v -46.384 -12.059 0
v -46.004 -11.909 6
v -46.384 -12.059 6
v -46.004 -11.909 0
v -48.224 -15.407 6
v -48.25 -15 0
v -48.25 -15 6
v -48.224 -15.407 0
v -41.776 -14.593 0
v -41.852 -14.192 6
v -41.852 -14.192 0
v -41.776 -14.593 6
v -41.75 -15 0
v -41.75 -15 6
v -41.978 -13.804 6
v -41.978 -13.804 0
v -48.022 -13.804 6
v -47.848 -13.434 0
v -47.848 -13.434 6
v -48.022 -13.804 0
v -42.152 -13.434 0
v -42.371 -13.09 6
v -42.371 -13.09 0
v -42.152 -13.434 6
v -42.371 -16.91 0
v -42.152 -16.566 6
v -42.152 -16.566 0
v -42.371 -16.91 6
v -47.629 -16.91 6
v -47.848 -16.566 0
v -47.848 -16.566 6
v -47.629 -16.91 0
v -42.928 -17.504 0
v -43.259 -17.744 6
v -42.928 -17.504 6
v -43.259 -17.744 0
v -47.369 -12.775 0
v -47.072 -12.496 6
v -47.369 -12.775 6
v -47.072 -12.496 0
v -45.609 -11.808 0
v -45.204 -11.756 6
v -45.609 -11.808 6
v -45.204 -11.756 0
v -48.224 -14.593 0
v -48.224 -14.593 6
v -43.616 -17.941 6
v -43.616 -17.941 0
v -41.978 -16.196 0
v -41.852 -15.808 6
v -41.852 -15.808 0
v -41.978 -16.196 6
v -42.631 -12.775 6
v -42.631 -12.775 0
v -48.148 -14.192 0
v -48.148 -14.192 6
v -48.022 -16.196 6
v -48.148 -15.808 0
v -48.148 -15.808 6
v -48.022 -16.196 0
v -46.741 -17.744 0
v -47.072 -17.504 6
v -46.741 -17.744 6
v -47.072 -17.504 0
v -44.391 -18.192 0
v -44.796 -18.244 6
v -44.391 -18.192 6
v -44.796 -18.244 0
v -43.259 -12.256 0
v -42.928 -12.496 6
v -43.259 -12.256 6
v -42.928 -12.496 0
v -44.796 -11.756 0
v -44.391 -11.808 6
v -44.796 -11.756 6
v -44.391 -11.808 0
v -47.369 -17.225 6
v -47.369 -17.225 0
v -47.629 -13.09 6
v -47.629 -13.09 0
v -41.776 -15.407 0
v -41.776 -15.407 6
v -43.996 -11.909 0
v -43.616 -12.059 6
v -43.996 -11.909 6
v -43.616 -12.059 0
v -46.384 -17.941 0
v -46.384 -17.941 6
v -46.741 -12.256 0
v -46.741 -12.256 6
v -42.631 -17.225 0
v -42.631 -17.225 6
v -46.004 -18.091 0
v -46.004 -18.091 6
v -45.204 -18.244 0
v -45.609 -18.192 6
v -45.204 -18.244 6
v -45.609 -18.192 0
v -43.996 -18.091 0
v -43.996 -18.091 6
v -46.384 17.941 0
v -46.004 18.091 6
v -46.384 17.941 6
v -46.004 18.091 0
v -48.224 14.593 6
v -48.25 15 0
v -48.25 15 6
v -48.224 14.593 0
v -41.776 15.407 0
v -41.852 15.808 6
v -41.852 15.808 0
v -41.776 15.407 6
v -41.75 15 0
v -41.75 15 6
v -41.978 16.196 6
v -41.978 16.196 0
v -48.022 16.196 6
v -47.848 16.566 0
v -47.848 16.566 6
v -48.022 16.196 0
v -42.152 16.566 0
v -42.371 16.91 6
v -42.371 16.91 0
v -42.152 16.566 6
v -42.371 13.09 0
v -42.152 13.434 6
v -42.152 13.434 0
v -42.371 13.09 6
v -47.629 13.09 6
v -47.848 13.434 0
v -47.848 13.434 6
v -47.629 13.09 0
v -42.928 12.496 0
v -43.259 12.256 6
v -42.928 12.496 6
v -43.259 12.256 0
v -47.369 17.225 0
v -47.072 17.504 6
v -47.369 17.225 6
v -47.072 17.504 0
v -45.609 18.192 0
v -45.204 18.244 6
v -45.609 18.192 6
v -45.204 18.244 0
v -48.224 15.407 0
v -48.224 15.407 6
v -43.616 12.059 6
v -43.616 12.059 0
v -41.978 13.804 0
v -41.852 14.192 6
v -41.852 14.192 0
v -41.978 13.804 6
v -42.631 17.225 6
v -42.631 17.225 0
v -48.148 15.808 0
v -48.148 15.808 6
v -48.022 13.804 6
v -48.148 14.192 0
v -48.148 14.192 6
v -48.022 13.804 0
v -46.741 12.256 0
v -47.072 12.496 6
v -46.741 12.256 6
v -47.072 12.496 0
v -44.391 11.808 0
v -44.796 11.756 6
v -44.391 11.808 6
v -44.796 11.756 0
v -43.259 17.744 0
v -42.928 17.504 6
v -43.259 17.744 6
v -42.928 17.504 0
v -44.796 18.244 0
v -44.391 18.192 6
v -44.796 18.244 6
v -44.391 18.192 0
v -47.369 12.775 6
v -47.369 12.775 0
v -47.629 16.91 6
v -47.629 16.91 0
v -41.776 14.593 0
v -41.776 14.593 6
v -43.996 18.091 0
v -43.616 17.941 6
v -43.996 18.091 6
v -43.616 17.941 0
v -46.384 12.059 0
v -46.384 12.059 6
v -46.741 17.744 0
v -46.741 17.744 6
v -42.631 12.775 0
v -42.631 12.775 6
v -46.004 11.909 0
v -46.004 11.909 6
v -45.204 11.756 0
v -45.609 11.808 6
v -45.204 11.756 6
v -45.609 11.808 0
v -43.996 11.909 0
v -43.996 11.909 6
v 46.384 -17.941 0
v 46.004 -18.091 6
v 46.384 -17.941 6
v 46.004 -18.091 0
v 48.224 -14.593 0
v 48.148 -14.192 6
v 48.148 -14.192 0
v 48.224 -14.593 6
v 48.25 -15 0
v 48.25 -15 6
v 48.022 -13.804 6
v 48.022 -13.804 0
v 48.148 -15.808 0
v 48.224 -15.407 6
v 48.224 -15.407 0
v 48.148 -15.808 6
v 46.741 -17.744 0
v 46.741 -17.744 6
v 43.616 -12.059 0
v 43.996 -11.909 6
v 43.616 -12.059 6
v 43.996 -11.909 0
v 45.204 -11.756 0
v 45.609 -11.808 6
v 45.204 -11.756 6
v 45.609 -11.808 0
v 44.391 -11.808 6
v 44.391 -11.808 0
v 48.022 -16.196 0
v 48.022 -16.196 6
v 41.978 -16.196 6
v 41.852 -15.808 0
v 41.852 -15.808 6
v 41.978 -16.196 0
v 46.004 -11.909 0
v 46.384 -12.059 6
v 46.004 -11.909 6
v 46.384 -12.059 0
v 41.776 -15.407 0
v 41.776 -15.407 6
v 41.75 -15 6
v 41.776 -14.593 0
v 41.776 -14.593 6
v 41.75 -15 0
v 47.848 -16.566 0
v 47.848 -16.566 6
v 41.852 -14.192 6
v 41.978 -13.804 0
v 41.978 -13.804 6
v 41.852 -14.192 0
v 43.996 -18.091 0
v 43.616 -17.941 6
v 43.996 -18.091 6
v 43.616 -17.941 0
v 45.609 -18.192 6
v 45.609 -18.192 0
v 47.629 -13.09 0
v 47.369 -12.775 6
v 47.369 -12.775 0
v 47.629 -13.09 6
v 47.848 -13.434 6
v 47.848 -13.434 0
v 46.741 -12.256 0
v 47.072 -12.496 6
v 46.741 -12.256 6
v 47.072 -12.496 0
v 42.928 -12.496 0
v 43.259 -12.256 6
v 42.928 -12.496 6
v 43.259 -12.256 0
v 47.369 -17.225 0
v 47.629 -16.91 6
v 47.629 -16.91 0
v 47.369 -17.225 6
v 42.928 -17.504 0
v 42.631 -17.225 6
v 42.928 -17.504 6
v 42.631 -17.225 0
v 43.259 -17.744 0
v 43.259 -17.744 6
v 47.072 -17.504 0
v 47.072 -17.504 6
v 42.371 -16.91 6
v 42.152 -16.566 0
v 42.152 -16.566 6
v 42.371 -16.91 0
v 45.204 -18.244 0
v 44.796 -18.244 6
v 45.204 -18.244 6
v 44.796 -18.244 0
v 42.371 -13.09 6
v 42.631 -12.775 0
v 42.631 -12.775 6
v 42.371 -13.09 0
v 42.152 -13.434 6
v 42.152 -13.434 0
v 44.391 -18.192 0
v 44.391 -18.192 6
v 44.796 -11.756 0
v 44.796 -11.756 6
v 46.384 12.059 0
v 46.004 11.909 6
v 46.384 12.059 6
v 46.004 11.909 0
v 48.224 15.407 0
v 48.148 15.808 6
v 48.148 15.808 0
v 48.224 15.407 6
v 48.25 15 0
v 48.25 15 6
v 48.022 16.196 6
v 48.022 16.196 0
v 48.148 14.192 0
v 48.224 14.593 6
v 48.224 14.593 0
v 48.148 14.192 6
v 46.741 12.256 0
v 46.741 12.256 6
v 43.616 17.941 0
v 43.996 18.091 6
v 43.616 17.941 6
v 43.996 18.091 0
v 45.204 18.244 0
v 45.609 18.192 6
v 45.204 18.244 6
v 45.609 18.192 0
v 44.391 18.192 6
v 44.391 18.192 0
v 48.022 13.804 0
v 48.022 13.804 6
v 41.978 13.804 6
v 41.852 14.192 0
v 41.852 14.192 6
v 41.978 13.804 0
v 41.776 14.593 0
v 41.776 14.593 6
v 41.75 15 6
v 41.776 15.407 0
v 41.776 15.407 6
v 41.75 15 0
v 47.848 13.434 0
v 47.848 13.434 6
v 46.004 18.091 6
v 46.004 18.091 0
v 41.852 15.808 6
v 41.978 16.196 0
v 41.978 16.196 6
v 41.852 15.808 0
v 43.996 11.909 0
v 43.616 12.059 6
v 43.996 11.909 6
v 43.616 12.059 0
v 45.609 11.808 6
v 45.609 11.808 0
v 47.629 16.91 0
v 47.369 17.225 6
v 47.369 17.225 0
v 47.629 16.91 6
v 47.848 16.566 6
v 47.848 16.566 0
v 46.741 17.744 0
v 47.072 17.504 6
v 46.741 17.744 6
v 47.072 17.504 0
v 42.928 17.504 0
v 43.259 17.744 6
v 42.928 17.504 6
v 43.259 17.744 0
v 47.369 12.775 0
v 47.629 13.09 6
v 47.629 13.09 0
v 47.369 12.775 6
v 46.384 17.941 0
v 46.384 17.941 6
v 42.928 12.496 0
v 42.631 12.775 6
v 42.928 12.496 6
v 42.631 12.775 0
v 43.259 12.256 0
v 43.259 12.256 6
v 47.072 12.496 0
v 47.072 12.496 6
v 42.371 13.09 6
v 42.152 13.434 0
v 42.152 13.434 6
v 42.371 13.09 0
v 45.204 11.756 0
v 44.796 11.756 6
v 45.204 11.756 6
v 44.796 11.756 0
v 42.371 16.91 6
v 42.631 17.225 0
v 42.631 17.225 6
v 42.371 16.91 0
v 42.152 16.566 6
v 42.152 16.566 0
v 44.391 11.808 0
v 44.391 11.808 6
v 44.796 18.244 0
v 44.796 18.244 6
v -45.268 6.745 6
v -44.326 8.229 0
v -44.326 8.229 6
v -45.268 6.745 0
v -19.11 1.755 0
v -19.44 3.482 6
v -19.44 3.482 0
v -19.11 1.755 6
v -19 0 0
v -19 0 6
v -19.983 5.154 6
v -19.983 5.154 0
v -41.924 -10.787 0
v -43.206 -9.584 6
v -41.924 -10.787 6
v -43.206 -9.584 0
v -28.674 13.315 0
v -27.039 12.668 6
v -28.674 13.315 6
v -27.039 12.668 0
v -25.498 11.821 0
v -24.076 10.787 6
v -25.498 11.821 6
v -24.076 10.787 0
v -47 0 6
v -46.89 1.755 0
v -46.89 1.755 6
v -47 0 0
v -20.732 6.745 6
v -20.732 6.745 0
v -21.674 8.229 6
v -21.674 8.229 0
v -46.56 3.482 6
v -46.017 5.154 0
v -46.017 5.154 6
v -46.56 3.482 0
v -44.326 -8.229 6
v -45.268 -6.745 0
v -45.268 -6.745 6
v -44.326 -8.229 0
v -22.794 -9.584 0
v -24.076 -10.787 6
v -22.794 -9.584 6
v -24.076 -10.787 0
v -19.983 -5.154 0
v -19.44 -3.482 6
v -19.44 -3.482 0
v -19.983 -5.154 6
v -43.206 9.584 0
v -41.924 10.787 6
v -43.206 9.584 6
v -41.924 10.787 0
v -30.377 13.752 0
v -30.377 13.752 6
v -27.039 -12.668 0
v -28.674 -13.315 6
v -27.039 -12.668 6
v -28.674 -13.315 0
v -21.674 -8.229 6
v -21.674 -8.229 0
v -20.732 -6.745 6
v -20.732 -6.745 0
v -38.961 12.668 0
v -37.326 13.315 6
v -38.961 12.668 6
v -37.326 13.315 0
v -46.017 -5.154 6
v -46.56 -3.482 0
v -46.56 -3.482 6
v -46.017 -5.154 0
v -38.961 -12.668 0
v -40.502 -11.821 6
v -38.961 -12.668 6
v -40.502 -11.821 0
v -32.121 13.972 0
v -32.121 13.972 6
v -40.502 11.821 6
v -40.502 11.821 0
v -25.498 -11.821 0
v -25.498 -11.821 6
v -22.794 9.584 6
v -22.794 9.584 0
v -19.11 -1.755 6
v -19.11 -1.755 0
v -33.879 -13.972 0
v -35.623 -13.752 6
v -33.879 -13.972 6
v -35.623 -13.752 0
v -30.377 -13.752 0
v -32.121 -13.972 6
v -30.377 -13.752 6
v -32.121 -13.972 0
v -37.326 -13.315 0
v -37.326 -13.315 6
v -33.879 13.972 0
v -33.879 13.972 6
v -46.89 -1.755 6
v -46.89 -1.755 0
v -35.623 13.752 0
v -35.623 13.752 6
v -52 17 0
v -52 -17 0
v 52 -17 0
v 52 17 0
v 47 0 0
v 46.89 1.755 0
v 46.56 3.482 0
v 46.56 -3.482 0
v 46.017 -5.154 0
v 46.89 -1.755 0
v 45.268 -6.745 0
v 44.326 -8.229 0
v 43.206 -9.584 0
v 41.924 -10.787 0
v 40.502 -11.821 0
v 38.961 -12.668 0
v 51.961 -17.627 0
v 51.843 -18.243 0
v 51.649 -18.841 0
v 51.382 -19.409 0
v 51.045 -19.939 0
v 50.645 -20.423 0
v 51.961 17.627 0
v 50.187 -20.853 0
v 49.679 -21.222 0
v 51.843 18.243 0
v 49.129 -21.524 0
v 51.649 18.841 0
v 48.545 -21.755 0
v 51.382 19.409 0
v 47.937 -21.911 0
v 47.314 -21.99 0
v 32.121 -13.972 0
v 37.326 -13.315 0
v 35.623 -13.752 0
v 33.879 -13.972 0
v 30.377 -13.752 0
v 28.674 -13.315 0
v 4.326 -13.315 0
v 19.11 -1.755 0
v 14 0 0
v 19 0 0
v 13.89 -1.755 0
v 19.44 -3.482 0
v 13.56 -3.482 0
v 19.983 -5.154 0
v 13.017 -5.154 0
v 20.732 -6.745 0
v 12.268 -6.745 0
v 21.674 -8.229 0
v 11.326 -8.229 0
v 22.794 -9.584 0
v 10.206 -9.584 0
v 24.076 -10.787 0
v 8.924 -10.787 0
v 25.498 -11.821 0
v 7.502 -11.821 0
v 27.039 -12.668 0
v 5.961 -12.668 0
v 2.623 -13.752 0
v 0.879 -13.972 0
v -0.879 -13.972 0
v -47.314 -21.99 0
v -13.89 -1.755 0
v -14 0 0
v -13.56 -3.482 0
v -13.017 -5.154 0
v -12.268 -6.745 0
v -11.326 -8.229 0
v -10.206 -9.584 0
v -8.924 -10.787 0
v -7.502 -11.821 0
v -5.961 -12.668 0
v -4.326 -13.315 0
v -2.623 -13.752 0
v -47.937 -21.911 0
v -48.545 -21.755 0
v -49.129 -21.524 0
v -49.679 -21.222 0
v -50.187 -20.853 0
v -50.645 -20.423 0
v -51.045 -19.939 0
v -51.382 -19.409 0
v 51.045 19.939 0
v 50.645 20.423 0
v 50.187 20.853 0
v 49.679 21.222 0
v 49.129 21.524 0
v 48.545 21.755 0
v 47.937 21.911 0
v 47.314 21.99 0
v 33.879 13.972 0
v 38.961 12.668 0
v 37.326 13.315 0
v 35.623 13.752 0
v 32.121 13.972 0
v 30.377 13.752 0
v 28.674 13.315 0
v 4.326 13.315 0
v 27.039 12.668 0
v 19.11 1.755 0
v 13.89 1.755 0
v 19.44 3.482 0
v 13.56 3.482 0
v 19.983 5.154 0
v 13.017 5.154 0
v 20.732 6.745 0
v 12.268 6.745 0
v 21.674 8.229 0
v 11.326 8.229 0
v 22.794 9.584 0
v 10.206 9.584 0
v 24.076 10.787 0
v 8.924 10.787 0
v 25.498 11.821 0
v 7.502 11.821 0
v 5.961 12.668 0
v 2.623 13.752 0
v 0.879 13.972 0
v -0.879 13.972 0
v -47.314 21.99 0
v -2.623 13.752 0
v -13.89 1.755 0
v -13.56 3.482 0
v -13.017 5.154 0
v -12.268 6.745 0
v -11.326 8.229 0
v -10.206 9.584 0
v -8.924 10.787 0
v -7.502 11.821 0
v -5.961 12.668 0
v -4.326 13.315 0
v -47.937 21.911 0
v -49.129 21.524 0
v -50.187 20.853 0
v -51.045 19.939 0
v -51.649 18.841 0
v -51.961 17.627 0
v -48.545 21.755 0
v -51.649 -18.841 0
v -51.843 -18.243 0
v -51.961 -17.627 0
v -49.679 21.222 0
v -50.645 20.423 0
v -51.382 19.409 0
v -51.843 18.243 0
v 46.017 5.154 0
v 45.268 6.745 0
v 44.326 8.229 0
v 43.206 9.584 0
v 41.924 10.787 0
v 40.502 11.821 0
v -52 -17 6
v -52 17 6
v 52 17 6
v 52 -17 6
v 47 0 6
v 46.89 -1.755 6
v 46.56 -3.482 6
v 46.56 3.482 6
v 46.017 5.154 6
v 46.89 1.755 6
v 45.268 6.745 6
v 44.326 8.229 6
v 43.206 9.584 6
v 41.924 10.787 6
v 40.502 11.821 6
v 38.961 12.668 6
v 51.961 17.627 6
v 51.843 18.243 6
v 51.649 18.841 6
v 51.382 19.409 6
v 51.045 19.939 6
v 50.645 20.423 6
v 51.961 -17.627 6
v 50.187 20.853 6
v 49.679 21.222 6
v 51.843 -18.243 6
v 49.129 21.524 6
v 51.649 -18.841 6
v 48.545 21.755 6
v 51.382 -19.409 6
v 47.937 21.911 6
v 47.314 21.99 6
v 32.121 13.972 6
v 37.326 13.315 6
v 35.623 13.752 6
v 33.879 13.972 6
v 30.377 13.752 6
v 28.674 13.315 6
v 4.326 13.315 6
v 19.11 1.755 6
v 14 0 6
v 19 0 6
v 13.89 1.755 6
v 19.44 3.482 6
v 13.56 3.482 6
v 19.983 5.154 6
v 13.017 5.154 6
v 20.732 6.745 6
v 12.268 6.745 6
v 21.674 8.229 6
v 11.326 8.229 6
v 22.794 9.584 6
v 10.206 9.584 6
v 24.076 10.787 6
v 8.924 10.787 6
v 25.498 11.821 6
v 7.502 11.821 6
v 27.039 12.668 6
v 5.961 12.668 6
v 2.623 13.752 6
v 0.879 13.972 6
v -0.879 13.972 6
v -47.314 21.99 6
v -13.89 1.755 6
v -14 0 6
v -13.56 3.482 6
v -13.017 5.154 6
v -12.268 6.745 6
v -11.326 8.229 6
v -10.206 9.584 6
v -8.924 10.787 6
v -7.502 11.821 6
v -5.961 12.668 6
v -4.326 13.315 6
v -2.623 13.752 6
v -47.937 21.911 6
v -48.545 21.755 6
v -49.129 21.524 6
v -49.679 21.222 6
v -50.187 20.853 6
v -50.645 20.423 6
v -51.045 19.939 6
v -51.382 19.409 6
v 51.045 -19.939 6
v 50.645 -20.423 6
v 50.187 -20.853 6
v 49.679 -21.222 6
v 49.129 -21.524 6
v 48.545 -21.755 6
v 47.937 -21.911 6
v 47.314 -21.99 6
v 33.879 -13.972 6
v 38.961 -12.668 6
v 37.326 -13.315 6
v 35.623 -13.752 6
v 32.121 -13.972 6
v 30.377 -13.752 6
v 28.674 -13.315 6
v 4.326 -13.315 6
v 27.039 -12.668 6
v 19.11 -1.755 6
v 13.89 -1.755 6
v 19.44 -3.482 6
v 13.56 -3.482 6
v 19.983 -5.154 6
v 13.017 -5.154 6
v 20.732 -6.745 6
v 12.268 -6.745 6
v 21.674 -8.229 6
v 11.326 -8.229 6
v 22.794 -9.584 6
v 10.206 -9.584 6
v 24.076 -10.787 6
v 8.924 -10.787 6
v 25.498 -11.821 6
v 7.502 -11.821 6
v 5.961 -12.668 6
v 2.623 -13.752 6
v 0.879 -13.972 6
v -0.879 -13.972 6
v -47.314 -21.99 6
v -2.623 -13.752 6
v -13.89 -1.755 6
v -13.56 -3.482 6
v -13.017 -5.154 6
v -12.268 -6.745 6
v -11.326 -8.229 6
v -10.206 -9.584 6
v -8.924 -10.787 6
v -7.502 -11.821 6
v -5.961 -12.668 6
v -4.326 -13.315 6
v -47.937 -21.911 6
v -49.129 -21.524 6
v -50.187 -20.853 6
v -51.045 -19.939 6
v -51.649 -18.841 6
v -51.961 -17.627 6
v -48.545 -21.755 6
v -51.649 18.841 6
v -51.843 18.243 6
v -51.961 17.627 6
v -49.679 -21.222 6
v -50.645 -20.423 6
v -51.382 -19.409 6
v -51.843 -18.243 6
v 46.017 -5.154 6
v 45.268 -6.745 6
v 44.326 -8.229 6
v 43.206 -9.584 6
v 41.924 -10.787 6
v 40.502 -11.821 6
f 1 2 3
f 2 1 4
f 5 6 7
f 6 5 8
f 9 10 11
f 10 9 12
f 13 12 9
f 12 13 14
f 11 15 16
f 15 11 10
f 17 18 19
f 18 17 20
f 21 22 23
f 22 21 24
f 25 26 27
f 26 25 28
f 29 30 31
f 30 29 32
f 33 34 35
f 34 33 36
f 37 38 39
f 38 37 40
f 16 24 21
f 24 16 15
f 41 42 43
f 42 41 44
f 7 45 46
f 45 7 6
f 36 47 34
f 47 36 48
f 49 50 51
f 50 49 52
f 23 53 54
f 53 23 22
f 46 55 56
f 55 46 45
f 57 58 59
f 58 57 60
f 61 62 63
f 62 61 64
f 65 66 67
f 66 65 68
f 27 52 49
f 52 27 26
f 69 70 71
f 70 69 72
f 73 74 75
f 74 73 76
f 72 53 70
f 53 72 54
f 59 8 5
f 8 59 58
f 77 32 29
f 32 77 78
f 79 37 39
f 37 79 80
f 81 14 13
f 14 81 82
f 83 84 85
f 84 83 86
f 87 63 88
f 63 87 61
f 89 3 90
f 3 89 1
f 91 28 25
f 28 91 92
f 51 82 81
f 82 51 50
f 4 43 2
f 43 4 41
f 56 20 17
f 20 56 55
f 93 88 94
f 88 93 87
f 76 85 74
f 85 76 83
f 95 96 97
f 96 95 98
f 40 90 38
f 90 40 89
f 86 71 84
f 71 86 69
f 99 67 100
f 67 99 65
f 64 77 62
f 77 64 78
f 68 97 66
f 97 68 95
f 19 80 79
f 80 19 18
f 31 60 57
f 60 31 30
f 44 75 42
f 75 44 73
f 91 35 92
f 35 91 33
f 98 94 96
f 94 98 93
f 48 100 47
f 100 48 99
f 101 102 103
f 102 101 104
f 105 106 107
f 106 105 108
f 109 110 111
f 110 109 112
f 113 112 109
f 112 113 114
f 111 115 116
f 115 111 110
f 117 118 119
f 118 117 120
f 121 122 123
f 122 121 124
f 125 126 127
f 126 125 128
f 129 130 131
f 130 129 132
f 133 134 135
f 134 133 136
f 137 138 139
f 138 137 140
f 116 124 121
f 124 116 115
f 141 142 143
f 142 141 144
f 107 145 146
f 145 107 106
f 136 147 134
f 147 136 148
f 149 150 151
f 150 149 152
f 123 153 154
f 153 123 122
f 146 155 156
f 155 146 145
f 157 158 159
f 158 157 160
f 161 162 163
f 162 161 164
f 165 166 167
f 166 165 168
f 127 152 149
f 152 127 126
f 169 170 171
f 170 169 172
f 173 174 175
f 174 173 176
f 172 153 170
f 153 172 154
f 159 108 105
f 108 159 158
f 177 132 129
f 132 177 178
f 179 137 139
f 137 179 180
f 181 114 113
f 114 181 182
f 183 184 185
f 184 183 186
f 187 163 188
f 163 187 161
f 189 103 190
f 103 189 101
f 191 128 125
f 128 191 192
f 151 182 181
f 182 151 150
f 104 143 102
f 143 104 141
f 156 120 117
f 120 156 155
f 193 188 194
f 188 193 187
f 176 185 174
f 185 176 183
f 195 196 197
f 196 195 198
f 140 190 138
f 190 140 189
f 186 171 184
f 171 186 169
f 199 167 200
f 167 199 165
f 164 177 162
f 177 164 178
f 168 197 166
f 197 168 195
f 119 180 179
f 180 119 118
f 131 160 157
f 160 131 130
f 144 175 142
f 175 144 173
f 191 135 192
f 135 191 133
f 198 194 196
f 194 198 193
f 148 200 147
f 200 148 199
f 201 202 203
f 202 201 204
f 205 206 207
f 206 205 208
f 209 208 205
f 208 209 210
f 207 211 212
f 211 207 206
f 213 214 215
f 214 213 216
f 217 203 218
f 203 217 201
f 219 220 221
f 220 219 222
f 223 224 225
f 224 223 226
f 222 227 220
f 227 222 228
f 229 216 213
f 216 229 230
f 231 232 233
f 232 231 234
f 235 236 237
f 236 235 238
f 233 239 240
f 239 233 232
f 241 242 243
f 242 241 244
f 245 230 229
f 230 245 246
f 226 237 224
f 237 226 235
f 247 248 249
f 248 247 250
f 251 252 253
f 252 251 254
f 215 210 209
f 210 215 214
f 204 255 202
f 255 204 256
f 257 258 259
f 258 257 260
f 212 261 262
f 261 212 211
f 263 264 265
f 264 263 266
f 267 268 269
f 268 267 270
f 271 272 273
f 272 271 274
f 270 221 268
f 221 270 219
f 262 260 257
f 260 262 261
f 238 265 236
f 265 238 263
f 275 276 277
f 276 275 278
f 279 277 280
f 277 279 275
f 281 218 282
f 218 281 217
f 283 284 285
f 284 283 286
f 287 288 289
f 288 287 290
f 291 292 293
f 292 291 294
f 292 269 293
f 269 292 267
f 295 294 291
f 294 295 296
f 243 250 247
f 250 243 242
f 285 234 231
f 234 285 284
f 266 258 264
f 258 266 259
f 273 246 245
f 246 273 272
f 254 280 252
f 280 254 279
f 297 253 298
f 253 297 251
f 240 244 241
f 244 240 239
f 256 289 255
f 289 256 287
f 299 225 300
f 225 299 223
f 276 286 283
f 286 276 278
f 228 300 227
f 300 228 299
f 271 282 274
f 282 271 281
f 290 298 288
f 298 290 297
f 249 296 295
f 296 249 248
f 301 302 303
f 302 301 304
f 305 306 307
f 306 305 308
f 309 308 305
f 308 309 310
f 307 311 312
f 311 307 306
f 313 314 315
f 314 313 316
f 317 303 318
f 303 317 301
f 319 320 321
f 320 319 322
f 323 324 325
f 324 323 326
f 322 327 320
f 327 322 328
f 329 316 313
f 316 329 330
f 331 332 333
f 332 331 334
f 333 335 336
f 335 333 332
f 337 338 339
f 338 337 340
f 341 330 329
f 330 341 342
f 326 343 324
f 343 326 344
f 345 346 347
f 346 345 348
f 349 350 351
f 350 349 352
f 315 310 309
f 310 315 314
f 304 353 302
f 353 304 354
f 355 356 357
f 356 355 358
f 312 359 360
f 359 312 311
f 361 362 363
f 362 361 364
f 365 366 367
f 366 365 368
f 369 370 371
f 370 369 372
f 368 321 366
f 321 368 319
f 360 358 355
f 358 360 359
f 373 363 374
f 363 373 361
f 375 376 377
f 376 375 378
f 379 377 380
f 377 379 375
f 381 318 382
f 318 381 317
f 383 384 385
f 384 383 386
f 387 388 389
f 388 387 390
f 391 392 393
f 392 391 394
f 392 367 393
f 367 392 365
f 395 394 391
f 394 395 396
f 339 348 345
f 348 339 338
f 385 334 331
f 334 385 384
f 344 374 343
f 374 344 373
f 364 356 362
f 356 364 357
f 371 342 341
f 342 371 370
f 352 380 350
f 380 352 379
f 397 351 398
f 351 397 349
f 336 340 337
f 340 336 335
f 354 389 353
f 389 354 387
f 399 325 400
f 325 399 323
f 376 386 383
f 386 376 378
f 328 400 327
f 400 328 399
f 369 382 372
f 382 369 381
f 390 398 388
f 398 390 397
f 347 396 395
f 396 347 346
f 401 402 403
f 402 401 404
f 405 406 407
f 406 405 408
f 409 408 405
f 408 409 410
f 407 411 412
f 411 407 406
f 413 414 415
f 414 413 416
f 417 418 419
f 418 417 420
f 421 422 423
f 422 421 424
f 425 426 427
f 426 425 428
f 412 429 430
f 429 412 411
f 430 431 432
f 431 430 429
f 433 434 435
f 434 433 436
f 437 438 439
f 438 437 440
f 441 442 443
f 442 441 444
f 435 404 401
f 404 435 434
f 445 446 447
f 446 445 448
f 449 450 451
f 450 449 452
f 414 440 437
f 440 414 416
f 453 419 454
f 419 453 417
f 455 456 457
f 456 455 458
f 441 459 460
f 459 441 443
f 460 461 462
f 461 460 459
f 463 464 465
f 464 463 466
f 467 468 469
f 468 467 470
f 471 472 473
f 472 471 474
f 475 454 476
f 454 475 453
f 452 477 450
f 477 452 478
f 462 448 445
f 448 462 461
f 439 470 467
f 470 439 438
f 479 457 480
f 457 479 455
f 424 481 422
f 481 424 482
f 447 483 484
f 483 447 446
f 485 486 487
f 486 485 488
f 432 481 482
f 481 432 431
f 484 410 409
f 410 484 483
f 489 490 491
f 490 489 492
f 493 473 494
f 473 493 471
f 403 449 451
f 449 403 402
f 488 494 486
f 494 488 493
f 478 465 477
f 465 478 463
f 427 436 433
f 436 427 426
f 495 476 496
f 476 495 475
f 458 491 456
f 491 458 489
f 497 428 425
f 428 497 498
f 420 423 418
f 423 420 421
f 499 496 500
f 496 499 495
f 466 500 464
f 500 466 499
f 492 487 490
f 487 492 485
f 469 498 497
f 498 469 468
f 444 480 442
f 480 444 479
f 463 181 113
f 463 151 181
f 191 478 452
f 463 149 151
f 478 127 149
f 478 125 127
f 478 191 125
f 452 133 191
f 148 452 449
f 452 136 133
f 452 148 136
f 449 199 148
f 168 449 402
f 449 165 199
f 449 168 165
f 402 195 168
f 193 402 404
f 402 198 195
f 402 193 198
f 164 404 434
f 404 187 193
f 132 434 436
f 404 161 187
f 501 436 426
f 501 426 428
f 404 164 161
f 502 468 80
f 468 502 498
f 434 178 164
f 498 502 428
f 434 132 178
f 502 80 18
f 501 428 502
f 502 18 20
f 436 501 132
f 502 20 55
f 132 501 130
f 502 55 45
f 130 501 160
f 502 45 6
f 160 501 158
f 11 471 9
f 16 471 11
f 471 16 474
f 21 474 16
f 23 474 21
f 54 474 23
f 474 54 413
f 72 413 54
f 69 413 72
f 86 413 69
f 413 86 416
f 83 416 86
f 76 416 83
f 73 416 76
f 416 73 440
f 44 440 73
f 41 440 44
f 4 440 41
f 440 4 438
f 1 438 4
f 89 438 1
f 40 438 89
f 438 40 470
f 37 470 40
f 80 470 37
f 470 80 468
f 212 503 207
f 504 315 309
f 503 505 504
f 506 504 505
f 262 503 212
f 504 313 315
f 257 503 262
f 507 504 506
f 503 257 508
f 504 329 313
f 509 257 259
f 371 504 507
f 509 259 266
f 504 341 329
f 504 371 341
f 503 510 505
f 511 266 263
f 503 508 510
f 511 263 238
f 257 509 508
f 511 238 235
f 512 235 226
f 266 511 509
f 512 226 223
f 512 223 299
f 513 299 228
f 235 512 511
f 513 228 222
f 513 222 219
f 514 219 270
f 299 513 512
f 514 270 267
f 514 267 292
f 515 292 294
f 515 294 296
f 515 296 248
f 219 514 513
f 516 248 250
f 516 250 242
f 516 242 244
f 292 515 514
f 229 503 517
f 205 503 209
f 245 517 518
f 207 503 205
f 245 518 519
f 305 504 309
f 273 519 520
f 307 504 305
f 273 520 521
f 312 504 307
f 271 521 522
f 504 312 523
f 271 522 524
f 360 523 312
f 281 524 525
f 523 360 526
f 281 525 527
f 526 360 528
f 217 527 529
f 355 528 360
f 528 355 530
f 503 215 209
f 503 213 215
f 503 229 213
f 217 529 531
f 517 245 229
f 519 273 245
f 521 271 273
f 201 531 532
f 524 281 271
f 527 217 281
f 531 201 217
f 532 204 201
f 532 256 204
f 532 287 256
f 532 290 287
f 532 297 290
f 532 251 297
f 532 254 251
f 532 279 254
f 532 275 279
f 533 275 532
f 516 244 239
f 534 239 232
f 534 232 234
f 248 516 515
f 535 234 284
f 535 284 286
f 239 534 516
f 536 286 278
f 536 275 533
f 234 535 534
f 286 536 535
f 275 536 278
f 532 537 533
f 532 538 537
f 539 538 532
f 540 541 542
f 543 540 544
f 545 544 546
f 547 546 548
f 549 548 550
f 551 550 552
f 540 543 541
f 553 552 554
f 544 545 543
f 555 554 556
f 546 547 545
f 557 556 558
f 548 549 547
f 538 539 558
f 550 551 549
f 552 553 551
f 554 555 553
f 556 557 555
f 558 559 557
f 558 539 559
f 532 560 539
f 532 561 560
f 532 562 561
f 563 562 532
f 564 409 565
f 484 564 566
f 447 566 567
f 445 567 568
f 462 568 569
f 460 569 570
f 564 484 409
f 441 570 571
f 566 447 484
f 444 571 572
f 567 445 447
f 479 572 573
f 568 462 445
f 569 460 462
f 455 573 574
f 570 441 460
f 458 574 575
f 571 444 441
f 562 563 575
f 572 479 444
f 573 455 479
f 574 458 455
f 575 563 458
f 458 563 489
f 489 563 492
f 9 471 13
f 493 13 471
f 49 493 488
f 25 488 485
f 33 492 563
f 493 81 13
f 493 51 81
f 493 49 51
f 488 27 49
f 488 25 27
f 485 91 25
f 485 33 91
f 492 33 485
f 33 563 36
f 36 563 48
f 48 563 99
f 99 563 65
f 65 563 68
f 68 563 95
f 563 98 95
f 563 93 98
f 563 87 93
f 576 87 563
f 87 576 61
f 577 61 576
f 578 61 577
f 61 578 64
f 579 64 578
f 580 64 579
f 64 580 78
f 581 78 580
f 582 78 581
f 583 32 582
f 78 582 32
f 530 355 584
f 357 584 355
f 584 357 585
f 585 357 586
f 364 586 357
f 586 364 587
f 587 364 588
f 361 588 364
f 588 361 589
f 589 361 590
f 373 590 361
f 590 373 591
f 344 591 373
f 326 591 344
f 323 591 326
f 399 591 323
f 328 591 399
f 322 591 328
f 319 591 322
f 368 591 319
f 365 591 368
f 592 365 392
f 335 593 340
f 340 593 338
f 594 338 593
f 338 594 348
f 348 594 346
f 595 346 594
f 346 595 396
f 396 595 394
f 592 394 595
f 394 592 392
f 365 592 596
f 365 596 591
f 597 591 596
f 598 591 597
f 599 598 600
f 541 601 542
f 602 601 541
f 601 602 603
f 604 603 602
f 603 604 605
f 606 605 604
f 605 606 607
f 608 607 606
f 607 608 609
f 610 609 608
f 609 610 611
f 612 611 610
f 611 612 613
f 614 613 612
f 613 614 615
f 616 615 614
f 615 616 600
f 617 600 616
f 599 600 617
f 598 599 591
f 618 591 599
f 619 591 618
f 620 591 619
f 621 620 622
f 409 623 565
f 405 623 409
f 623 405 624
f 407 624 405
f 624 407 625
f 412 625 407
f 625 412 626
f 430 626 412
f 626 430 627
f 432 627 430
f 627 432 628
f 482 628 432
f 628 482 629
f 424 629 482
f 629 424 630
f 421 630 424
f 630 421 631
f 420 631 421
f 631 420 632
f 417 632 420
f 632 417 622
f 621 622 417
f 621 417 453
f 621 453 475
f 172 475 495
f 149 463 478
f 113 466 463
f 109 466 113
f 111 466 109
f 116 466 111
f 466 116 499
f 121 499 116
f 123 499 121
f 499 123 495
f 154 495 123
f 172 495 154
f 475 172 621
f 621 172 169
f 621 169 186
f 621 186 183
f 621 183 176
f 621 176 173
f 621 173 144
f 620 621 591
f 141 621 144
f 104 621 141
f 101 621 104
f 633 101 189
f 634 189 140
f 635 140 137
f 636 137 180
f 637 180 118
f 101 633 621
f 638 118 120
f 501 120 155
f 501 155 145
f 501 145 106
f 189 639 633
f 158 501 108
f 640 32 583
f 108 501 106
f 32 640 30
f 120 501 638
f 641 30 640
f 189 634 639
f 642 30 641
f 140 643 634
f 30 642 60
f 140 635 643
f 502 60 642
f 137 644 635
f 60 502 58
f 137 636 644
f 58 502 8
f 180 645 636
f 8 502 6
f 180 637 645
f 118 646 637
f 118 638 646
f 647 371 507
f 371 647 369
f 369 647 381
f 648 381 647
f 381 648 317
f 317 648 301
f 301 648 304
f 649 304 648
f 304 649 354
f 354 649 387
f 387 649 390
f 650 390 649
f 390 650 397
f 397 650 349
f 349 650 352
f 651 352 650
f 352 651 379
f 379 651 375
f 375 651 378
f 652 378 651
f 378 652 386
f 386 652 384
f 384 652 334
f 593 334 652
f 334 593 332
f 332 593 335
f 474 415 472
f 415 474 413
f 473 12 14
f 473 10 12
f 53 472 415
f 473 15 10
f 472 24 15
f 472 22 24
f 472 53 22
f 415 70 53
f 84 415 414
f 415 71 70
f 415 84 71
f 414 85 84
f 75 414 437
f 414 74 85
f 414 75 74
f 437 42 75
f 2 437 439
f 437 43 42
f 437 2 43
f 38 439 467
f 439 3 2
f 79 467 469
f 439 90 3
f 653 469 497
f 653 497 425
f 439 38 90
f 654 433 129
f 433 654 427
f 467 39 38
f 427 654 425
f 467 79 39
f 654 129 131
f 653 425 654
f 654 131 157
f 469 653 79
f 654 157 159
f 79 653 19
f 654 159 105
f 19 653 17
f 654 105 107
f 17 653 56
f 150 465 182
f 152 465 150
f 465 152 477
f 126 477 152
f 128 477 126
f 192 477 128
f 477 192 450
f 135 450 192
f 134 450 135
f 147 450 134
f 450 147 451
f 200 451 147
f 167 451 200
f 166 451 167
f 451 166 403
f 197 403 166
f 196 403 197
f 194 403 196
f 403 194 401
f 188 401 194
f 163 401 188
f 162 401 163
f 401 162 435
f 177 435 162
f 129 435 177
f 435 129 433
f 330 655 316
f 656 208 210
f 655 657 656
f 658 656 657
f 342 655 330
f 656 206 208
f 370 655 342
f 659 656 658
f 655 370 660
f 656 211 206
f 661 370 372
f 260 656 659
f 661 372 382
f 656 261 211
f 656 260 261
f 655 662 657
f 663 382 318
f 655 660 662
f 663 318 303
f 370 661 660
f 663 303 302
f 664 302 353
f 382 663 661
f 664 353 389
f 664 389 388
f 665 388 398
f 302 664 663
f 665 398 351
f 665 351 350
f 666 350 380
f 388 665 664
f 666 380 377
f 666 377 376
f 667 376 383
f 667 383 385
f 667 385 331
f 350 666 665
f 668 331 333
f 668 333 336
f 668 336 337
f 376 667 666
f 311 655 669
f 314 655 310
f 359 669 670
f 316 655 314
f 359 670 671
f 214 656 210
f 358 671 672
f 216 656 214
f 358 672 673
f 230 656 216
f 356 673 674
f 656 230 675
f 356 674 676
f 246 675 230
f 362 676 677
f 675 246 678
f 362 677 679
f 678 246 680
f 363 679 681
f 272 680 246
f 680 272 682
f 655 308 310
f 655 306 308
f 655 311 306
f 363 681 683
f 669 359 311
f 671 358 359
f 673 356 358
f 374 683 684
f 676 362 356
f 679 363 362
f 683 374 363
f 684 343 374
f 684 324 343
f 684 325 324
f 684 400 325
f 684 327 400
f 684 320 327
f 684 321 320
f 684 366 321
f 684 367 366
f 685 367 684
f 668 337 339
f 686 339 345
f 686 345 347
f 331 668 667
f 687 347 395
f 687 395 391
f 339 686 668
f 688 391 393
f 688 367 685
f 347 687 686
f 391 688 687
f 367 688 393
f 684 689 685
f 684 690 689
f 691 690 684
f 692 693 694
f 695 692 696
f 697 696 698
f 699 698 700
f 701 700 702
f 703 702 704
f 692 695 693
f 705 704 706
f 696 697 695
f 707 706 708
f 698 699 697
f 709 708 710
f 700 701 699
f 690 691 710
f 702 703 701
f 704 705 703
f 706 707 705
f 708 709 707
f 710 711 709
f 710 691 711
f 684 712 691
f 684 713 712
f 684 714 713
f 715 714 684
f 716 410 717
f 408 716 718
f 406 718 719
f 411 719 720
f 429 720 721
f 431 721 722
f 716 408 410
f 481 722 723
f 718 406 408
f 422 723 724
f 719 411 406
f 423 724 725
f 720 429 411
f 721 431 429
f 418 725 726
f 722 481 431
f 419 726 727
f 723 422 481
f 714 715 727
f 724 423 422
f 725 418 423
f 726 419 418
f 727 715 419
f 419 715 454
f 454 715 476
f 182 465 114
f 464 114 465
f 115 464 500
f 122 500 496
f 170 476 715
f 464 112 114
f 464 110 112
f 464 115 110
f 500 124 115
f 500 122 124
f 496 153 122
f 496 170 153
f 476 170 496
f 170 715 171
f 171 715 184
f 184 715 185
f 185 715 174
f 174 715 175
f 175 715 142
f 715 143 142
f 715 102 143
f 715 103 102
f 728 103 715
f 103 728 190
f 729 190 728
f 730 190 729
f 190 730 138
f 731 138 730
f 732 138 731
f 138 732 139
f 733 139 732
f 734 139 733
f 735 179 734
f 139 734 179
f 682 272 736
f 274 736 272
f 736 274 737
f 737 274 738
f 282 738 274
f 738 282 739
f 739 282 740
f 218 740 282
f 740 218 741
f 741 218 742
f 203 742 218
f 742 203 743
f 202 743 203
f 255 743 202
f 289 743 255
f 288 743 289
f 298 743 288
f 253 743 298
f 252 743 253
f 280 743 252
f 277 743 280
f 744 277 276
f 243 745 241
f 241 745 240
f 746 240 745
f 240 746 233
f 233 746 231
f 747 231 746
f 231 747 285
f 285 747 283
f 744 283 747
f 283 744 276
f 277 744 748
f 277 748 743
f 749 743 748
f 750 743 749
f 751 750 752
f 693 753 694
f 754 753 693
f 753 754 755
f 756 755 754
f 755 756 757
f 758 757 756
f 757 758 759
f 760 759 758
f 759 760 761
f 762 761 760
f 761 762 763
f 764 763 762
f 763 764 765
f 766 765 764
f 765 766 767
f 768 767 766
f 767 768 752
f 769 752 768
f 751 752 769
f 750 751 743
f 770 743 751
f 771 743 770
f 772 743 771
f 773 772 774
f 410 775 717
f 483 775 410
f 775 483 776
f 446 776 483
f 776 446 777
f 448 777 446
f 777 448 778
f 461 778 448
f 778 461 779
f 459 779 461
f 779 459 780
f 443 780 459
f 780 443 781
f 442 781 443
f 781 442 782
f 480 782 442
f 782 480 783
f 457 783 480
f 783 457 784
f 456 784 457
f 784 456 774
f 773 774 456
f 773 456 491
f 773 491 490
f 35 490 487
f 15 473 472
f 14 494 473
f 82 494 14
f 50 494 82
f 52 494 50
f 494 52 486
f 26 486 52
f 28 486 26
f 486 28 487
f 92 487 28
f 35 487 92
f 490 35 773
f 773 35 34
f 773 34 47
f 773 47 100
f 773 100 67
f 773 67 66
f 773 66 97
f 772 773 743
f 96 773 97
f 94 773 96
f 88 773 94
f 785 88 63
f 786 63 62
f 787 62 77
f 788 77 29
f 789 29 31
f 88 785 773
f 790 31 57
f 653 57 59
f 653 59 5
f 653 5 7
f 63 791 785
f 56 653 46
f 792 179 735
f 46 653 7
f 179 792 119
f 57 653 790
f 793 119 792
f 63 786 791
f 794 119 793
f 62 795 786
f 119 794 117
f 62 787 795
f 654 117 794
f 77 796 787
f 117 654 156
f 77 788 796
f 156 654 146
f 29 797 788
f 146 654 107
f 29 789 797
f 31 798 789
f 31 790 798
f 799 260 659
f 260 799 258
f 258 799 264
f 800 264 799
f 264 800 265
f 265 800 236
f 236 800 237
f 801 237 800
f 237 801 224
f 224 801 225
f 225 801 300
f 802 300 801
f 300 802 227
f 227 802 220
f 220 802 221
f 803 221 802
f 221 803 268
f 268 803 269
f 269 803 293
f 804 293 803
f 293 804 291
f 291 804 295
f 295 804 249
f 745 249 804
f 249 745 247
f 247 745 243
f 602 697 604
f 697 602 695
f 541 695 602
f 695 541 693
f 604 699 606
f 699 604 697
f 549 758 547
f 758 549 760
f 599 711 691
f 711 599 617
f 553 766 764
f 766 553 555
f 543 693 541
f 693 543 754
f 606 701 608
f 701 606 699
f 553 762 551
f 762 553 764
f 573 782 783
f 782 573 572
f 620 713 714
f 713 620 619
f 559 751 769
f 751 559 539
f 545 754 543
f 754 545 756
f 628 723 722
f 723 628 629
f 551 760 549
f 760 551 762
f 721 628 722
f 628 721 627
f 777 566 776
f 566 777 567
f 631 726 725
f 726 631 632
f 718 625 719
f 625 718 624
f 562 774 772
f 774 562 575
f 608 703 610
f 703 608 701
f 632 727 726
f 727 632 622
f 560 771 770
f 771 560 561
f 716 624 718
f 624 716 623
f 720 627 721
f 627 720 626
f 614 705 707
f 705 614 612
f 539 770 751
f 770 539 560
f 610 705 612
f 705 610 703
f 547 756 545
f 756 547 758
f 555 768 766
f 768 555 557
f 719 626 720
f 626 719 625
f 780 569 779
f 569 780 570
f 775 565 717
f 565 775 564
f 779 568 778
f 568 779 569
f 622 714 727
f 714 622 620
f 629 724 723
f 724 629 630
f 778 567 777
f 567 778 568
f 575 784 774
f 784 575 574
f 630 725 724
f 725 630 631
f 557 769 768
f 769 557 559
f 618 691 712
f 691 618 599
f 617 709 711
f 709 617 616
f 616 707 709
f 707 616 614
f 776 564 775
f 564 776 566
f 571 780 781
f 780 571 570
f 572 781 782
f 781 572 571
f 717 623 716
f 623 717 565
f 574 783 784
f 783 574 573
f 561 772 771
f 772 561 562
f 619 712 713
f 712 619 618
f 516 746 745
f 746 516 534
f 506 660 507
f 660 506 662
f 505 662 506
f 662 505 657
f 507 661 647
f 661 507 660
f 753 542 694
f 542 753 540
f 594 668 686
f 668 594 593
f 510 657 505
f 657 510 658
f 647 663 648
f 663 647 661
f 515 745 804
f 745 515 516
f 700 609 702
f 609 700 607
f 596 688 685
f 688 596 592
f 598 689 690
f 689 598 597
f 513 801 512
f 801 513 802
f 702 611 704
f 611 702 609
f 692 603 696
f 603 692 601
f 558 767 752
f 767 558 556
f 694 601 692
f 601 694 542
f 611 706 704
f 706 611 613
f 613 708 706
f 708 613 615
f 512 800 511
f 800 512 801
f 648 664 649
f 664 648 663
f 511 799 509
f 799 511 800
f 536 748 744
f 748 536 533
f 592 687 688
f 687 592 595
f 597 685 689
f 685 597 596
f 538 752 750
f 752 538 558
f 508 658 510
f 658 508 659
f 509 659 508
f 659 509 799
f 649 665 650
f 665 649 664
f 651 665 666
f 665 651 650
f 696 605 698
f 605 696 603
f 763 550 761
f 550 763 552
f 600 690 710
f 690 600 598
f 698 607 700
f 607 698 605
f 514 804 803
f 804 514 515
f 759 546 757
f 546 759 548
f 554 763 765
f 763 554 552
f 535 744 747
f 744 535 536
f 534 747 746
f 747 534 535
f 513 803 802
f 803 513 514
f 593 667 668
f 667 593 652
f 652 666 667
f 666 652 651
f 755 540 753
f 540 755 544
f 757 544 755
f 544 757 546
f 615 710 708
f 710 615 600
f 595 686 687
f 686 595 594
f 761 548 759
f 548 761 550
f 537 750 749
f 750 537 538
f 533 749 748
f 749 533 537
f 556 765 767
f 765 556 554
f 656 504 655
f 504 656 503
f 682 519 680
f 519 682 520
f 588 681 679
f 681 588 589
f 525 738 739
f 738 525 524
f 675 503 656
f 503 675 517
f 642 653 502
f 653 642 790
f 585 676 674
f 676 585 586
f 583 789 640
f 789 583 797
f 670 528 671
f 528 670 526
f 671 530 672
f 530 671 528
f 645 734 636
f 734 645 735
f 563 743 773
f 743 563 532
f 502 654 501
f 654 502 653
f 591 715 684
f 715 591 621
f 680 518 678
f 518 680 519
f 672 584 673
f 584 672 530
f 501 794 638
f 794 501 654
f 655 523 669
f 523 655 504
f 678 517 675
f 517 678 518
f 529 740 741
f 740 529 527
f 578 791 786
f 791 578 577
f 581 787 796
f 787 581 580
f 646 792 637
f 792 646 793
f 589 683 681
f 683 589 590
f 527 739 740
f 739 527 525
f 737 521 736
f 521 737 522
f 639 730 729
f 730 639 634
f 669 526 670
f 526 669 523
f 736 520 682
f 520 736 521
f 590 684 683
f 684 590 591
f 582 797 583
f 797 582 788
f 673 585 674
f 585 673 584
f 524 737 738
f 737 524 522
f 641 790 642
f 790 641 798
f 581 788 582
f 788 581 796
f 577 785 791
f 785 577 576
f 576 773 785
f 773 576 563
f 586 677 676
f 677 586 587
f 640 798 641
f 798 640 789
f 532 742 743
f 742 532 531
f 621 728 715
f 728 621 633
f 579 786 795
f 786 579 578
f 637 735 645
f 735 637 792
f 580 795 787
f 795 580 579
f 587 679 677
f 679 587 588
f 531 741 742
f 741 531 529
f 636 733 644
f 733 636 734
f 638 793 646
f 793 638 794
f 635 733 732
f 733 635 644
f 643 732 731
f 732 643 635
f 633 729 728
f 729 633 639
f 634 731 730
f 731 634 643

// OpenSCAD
$fn = 50;


difference() {
	union() {
		hull() {
			translate(v = [-47.0000000000, 17.0000000000, 0]) {
				cylinder(h = 6, r = 5);
			}
			translate(v = [47.0000000000, 17.0000000000, 0]) {
				cylinder(h = 6, r = 5);
			}
			translate(v = [-47.0000000000, -17.0000000000, 0]) {
				cylinder(h = 6, r = 5);
			}
			translate(v = [47.0000000000, -17.0000000000, 0]) {
				cylinder(h = 6, r = 5);
			}
		}
	}
	union() {
		#translate(v = [-45.0000000000, -15.0000000000, -100.0000000000]) {
			cylinder(h = 200, r = 3.2500000000);
		}
		#translate(v = [-45.0000000000, 15.0000000000, -100.0000000000]) {
			cylinder(h = 200, r = 3.2500000000);
		}
		#translate(v = [45.0000000000, -15.0000000000, -100.0000000000]) {
			cylinder(h = 200, r = 3.2500000000);
		}
		#translate(v = [45.0000000000, 15.0000000000, -100.0000000000]) {
			cylinder(h = 200, r = 3.2500000000);
		}
		#translate(v = [-33.0000000000, 0, 0]) {
			cylinder(h = 6, r = 14.0000000000);
		}
		#cylinder(h = 6, r = 14.0000000000);
		#translate(v = [33.0000000000, 0, 0]) {
			cylinder(h = 6, r = 14.0000000000);
		}
	}
}
